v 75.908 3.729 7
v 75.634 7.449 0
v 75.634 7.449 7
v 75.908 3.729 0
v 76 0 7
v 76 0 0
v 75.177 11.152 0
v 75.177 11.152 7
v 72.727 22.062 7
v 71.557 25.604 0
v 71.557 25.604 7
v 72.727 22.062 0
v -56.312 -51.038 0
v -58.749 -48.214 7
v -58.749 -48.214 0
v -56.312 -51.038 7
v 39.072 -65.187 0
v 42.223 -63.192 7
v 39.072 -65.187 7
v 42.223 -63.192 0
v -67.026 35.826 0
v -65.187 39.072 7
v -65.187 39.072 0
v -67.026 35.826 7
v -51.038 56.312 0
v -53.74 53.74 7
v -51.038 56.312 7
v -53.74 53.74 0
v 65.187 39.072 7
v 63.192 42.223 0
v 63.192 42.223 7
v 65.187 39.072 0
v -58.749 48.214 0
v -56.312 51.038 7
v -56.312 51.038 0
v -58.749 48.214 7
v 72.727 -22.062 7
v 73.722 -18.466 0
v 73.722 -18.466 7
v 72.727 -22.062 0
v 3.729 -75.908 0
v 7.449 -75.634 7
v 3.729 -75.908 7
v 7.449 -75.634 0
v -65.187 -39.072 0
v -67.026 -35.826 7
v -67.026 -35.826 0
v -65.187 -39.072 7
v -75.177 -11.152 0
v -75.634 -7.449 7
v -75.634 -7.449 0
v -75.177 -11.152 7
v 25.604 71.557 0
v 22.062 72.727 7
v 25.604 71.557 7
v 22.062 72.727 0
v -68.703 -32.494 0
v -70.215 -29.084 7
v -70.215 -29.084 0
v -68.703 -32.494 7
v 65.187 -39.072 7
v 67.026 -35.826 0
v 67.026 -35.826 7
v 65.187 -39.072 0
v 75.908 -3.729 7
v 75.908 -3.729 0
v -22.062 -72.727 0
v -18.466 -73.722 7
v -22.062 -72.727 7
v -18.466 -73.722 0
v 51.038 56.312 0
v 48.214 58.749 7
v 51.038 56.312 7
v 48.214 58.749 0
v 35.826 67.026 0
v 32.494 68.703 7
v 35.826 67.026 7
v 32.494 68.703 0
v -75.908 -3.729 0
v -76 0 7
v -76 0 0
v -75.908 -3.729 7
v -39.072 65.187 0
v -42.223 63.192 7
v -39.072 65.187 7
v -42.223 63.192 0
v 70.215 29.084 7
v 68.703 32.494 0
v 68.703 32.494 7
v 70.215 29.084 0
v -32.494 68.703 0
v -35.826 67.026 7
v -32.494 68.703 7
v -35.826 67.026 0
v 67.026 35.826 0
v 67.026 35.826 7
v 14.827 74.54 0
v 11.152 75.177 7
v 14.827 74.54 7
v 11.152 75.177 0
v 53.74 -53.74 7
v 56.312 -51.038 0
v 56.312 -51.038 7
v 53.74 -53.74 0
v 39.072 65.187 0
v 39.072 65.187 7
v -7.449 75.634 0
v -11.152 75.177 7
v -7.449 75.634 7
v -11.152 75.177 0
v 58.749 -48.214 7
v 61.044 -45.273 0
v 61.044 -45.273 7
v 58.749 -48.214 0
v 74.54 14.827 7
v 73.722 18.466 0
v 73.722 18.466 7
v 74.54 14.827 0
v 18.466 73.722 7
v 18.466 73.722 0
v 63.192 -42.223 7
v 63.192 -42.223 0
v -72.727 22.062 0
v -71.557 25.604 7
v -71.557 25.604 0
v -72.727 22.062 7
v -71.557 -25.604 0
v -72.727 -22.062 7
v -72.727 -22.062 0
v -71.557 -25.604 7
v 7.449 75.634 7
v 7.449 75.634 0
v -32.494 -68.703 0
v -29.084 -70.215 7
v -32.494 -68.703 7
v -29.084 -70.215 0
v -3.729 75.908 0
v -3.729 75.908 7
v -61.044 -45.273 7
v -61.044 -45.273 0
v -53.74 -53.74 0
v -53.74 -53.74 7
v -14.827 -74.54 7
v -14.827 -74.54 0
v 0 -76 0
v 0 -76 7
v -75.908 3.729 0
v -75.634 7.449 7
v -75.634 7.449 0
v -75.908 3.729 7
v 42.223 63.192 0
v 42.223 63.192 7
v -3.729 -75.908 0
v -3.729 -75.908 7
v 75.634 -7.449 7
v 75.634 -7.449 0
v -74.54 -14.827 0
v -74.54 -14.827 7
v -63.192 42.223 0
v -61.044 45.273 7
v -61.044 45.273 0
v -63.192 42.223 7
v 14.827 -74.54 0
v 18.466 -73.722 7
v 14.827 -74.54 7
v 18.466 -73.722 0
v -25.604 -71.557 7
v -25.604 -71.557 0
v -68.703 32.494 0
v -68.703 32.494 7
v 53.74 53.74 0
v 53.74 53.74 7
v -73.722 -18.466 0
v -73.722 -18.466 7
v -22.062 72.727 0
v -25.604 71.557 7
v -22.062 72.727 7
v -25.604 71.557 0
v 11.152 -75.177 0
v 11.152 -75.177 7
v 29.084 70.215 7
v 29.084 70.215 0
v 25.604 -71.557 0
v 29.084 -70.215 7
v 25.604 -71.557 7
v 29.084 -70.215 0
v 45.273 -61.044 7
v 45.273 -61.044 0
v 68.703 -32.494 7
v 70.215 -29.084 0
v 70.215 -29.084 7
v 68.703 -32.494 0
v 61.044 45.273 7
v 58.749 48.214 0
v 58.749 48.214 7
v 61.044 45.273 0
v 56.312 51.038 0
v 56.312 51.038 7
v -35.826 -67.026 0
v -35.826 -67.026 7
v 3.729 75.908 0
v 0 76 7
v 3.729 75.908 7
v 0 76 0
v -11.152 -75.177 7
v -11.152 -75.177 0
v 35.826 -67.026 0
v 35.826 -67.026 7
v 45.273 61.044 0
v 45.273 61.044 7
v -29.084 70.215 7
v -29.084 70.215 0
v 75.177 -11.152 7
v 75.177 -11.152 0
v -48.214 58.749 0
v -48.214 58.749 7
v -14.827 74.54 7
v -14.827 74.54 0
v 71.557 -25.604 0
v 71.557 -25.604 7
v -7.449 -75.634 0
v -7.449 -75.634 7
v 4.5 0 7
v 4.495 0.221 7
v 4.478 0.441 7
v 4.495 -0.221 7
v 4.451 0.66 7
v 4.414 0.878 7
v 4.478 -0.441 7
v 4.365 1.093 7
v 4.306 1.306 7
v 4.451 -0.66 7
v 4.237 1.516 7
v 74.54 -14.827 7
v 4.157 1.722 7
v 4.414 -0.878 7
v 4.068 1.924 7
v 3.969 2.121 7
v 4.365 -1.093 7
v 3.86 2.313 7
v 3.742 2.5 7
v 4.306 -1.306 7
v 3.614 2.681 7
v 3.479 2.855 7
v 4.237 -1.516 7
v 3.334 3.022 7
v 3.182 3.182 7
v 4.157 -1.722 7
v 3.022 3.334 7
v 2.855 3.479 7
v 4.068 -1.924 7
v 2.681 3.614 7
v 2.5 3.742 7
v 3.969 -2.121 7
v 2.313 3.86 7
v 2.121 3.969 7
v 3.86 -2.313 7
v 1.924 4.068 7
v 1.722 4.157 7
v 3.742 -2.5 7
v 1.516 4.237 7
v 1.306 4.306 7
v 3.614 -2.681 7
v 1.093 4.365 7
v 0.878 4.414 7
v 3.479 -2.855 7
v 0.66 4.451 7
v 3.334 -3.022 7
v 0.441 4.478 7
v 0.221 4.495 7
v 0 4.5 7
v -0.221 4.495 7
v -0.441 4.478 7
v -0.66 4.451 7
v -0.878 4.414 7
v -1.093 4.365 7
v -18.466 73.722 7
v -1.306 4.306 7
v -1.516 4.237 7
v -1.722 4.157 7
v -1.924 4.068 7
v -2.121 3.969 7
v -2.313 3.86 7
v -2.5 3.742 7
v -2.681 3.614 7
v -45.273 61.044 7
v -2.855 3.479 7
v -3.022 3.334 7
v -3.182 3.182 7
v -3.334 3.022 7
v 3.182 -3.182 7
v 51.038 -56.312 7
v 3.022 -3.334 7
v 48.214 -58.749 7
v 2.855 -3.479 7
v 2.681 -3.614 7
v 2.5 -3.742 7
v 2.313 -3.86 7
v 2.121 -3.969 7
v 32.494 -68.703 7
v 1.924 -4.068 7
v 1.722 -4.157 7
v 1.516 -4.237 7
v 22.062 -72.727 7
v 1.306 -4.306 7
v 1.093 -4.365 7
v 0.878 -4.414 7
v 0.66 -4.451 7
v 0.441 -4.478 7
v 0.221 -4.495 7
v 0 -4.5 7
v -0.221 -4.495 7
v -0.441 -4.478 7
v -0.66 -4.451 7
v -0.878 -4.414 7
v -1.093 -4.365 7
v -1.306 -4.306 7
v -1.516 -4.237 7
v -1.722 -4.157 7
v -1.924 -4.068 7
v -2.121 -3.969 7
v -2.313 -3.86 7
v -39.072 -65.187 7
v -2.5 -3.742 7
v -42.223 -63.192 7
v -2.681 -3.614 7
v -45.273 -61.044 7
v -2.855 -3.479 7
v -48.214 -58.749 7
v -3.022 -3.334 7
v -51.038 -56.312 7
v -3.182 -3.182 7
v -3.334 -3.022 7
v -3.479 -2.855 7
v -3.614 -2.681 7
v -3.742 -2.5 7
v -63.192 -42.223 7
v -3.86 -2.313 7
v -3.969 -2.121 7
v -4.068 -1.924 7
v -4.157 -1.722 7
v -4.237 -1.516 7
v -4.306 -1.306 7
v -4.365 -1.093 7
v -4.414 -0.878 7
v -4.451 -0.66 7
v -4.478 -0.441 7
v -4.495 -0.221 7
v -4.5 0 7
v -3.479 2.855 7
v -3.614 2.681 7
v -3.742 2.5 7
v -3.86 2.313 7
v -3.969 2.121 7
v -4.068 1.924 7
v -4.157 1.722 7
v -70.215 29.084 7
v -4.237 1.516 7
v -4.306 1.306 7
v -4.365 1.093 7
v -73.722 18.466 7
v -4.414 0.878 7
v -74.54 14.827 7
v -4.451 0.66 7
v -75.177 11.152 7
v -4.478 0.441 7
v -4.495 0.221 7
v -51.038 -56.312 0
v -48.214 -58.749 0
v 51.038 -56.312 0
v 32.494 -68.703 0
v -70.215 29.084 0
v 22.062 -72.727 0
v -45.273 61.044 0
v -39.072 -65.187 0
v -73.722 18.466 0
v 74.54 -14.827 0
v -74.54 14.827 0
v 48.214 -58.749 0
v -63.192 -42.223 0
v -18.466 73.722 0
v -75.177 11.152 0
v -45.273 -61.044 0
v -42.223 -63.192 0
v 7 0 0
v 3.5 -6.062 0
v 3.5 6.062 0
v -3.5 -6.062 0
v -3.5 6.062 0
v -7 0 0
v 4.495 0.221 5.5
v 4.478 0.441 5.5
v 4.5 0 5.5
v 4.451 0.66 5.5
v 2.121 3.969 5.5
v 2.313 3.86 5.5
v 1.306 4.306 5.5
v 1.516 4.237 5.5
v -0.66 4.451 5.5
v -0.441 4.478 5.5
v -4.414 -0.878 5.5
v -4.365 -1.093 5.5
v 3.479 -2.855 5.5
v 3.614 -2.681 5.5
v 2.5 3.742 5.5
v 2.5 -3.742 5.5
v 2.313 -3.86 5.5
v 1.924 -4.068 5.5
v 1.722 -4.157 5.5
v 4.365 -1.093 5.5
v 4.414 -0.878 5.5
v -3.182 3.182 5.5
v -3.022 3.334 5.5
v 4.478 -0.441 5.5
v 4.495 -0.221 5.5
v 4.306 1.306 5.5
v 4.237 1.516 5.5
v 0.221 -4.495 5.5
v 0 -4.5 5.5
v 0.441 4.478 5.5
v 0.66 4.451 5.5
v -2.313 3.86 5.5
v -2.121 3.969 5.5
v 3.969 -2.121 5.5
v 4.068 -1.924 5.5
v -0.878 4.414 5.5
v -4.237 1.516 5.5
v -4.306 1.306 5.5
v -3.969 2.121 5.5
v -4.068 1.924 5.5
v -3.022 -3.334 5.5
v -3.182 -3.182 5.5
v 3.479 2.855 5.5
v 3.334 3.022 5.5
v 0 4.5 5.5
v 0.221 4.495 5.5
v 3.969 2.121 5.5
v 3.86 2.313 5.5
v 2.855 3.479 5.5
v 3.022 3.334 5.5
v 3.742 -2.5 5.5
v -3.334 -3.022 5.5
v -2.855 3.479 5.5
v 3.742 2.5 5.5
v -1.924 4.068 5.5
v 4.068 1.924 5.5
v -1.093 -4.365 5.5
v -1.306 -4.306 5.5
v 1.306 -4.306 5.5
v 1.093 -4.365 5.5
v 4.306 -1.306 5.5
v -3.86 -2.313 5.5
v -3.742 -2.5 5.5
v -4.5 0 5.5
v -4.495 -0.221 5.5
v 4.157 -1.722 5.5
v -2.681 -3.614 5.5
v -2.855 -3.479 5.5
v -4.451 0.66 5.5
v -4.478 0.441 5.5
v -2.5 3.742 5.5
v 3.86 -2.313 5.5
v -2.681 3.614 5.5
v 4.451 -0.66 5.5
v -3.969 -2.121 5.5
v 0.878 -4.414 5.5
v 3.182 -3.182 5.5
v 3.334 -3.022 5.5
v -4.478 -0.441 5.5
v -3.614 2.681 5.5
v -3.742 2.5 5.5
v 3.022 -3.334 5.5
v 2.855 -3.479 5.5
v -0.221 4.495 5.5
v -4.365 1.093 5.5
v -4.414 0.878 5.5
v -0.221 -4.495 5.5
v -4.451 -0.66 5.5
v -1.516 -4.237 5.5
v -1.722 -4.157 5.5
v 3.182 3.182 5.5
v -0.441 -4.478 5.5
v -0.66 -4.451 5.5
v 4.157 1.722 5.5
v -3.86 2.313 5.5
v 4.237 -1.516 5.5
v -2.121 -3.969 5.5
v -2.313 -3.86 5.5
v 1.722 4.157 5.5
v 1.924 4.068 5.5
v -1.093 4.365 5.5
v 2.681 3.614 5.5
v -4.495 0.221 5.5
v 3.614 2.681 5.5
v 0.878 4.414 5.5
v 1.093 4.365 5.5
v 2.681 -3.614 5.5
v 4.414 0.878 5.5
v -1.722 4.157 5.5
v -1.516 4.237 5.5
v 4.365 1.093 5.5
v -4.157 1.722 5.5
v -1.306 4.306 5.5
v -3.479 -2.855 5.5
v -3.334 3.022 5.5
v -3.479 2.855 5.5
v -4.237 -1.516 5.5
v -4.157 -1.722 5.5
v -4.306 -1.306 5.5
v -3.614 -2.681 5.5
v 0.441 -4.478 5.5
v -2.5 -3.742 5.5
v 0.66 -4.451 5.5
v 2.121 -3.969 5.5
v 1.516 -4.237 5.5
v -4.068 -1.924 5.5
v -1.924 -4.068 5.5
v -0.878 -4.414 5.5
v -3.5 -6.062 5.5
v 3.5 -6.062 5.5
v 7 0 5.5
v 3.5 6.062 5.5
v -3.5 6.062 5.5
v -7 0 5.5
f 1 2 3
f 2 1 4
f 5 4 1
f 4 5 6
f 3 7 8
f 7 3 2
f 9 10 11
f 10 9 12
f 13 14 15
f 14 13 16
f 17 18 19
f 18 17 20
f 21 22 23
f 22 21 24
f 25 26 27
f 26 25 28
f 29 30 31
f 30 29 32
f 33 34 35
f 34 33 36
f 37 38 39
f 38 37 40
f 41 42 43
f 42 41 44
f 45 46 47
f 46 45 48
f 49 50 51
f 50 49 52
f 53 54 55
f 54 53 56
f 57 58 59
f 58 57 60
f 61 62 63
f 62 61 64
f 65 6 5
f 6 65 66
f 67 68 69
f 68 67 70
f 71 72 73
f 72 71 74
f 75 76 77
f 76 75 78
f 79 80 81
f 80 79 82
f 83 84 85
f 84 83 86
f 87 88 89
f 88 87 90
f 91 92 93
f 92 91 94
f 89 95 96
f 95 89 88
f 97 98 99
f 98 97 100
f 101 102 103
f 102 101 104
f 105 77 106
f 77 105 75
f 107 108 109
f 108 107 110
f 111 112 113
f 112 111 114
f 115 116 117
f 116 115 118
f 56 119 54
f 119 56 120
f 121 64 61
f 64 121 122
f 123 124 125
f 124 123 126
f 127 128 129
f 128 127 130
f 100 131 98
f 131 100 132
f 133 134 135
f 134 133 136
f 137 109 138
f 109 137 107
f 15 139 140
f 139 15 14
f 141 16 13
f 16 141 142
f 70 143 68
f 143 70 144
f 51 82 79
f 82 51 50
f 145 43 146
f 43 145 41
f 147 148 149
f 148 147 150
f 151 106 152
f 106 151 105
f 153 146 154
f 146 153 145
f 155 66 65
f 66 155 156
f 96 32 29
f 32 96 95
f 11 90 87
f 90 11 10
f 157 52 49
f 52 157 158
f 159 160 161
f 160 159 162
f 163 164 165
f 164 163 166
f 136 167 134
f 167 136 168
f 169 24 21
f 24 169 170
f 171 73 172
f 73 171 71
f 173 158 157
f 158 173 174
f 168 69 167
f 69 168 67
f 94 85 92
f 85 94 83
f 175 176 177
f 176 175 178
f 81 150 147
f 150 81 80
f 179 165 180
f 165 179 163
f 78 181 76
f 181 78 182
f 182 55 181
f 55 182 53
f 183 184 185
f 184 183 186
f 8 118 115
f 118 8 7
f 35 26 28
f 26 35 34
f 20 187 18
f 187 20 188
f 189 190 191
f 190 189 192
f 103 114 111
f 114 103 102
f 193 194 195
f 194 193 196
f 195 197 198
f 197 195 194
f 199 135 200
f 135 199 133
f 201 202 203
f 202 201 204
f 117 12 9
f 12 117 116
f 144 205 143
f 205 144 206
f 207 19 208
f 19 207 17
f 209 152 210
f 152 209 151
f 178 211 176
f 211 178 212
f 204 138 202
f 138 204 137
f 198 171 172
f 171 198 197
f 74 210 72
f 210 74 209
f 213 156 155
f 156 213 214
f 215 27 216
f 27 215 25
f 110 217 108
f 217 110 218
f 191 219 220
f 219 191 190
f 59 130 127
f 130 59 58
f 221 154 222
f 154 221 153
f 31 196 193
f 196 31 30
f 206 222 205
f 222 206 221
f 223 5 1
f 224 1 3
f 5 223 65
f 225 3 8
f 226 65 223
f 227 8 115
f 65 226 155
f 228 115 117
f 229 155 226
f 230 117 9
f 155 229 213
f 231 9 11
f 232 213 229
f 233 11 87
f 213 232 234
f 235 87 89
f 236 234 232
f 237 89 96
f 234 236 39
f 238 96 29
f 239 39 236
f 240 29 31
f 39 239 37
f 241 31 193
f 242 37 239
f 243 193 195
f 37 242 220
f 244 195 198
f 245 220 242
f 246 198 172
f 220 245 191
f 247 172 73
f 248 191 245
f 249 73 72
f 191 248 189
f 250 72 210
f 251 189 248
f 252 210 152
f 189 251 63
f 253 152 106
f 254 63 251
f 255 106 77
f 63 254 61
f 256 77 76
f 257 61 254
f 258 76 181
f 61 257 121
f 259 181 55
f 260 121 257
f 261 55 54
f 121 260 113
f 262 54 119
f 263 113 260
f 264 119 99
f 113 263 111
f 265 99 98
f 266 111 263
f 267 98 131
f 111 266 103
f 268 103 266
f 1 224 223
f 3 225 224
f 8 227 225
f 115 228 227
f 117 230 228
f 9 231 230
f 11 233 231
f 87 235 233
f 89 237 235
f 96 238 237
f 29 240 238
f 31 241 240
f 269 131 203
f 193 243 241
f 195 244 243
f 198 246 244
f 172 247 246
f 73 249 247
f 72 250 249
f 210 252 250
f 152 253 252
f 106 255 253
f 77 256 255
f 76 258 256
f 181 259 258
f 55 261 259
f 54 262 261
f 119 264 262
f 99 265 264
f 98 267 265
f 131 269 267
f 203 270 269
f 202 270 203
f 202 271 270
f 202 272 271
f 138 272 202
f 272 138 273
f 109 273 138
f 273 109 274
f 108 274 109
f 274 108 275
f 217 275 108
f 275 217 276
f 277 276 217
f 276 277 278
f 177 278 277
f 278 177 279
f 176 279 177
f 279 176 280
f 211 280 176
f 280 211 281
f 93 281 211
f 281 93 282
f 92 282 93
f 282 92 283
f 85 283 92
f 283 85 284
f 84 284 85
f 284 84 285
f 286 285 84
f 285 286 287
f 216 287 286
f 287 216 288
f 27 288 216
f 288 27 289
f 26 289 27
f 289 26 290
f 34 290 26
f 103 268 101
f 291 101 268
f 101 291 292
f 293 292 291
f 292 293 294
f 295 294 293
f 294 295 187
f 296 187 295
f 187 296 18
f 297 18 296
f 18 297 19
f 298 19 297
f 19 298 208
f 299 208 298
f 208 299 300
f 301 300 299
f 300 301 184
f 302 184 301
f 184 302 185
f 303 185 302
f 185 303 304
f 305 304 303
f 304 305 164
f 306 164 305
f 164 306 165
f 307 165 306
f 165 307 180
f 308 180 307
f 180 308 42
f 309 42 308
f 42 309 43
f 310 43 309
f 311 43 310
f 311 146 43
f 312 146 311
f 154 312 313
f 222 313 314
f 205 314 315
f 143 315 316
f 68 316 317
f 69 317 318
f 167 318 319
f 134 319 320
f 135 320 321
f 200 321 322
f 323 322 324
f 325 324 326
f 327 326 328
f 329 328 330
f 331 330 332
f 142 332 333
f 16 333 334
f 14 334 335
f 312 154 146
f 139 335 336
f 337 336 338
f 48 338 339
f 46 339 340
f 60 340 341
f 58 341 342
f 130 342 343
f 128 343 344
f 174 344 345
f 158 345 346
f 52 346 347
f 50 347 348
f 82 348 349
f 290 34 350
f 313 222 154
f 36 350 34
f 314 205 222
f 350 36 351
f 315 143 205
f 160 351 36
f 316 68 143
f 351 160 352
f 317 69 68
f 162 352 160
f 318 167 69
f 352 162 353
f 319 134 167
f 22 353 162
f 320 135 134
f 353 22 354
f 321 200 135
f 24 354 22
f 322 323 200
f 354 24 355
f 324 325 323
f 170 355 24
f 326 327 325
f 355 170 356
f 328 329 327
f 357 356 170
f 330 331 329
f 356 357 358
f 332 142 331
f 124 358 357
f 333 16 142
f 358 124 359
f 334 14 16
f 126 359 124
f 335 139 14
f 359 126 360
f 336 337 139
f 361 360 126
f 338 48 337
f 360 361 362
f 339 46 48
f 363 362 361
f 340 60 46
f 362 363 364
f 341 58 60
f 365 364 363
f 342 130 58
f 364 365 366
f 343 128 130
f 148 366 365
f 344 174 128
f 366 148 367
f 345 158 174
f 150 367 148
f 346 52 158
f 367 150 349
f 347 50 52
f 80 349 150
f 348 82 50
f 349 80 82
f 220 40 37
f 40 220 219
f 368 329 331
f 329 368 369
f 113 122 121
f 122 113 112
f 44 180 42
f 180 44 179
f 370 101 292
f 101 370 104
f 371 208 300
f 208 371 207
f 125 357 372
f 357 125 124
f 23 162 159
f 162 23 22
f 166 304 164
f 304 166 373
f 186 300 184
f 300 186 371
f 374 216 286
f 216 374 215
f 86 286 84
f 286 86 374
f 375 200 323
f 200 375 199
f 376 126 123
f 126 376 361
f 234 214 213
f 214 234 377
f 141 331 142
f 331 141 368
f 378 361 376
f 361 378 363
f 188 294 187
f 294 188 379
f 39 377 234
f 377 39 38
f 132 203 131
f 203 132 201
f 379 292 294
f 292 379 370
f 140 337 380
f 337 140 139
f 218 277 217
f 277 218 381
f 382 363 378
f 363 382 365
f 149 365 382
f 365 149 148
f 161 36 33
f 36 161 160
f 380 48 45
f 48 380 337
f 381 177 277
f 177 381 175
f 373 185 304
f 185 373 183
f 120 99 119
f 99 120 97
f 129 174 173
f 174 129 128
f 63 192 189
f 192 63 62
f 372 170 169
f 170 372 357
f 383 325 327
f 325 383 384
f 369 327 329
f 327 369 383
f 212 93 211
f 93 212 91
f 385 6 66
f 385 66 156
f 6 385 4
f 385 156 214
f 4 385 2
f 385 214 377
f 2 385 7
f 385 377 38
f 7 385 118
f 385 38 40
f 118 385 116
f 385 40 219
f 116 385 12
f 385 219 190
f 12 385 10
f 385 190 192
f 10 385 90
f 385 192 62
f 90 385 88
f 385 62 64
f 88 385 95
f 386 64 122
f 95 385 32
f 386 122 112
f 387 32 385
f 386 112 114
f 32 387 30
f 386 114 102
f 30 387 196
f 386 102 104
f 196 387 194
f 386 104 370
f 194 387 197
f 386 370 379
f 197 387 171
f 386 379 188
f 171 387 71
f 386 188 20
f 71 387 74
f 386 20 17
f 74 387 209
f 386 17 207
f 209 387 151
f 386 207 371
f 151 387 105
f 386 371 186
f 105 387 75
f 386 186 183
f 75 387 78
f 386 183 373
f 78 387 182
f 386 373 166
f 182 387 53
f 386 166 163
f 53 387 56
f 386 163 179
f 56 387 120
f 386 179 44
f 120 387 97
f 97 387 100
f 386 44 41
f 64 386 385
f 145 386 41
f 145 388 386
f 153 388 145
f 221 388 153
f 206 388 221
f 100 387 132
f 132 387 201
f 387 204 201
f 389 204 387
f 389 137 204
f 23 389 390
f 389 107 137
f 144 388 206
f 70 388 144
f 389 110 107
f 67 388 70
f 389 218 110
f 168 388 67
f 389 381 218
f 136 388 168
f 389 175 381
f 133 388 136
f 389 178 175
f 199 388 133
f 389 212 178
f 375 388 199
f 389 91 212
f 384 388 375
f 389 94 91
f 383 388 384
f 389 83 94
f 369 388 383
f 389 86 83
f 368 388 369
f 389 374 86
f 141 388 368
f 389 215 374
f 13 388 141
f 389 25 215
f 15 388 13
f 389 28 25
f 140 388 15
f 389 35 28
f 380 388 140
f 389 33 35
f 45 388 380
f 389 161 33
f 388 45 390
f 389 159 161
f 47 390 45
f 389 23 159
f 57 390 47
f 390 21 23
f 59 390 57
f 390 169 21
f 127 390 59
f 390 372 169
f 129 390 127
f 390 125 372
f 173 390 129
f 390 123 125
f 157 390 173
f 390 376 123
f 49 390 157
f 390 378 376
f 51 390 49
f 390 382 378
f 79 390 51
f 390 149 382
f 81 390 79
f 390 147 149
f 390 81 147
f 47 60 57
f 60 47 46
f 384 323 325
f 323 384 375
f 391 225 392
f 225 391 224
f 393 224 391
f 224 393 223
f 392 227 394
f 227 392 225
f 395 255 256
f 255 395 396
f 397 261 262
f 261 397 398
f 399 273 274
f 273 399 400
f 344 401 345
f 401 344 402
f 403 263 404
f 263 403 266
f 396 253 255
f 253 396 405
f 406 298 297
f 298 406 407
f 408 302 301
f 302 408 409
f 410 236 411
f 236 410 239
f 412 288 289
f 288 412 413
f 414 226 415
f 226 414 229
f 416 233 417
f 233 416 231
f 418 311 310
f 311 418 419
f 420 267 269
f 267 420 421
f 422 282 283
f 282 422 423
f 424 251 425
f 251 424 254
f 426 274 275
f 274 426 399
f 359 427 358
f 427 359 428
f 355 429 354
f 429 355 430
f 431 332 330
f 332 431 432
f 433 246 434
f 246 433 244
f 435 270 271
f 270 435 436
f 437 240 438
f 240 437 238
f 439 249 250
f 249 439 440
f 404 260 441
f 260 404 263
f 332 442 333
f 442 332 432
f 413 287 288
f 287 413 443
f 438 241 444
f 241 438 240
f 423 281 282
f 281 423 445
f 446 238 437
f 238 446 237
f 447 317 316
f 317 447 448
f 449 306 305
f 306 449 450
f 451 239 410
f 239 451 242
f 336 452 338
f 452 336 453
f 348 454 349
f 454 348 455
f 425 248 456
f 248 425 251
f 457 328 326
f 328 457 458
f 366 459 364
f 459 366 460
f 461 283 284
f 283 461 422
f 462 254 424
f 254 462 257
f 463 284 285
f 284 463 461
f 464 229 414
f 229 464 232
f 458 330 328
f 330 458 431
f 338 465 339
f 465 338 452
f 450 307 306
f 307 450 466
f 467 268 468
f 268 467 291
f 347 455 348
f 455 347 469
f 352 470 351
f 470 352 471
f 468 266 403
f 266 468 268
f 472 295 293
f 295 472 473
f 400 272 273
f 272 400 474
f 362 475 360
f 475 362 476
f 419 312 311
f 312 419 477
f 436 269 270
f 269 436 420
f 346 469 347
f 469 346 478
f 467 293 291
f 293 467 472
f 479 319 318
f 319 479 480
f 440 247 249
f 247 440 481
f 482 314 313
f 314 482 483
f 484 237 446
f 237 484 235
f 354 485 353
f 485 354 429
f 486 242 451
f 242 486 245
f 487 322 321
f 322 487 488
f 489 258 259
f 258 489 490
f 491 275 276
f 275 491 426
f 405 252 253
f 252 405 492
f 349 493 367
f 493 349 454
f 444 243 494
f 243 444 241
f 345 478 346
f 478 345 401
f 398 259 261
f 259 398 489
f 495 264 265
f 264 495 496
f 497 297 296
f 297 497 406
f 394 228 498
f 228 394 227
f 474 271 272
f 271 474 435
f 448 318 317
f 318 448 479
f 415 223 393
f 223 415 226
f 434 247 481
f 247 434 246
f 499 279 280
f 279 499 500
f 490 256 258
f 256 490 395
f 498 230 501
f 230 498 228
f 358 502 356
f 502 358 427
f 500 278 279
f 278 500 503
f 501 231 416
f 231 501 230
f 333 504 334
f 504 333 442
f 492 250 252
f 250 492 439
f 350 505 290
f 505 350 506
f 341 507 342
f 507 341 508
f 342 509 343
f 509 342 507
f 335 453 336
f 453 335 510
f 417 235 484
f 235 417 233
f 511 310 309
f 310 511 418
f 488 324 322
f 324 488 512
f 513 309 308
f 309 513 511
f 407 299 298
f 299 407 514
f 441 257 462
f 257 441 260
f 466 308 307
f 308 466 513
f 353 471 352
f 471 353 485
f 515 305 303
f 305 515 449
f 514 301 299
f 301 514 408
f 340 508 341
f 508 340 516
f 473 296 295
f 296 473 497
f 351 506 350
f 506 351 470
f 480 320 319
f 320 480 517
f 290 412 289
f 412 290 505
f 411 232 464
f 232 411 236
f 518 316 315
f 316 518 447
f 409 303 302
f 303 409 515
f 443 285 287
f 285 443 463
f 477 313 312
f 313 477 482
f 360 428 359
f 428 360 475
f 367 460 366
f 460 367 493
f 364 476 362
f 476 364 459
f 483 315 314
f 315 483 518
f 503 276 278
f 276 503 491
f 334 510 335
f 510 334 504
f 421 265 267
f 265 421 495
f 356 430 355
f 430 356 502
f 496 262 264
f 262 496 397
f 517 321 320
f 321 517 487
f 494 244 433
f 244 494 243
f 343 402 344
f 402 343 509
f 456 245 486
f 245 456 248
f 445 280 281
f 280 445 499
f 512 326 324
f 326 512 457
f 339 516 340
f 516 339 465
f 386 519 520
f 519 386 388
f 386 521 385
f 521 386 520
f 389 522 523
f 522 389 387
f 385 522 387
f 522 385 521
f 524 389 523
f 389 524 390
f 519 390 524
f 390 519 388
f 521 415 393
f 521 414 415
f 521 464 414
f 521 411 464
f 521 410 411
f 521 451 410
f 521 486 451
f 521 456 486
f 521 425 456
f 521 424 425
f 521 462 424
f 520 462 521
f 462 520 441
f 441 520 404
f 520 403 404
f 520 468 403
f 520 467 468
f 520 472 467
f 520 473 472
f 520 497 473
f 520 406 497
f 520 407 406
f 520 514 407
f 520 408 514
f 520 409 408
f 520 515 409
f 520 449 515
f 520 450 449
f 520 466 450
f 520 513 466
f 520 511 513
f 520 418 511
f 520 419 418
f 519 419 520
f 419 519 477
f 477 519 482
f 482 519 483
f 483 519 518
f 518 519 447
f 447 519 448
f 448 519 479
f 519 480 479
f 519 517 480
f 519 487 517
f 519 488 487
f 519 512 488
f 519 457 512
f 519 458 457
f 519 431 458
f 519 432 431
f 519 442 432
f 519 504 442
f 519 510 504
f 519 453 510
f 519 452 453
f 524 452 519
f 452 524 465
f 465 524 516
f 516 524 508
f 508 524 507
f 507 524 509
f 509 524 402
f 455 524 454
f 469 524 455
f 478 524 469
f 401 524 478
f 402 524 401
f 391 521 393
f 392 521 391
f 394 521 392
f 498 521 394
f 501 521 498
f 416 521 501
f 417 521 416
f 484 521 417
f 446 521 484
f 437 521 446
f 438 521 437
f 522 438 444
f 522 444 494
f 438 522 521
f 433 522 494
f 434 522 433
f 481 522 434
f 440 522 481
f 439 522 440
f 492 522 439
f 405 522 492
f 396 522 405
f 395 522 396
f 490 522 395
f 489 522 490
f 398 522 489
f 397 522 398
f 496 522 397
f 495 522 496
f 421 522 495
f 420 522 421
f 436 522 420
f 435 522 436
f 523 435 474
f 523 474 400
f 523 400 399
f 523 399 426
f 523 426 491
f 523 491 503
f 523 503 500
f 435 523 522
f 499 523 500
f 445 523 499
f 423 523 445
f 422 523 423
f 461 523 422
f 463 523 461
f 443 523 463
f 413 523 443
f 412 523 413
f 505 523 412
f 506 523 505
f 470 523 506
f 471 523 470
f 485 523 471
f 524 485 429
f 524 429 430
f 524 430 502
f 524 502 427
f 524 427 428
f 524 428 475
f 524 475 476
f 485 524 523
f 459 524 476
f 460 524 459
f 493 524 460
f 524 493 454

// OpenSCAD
difference() {
 union() {
  cylinder (d=152,h=7,$fn=128);
  }
 translate ([0,0,-1])
  cylinder (d=9,h=9,$fn=128);
 translate ([0,0,-1])
  cylinder (d=14,h=6.5,$fn=6);
  }
